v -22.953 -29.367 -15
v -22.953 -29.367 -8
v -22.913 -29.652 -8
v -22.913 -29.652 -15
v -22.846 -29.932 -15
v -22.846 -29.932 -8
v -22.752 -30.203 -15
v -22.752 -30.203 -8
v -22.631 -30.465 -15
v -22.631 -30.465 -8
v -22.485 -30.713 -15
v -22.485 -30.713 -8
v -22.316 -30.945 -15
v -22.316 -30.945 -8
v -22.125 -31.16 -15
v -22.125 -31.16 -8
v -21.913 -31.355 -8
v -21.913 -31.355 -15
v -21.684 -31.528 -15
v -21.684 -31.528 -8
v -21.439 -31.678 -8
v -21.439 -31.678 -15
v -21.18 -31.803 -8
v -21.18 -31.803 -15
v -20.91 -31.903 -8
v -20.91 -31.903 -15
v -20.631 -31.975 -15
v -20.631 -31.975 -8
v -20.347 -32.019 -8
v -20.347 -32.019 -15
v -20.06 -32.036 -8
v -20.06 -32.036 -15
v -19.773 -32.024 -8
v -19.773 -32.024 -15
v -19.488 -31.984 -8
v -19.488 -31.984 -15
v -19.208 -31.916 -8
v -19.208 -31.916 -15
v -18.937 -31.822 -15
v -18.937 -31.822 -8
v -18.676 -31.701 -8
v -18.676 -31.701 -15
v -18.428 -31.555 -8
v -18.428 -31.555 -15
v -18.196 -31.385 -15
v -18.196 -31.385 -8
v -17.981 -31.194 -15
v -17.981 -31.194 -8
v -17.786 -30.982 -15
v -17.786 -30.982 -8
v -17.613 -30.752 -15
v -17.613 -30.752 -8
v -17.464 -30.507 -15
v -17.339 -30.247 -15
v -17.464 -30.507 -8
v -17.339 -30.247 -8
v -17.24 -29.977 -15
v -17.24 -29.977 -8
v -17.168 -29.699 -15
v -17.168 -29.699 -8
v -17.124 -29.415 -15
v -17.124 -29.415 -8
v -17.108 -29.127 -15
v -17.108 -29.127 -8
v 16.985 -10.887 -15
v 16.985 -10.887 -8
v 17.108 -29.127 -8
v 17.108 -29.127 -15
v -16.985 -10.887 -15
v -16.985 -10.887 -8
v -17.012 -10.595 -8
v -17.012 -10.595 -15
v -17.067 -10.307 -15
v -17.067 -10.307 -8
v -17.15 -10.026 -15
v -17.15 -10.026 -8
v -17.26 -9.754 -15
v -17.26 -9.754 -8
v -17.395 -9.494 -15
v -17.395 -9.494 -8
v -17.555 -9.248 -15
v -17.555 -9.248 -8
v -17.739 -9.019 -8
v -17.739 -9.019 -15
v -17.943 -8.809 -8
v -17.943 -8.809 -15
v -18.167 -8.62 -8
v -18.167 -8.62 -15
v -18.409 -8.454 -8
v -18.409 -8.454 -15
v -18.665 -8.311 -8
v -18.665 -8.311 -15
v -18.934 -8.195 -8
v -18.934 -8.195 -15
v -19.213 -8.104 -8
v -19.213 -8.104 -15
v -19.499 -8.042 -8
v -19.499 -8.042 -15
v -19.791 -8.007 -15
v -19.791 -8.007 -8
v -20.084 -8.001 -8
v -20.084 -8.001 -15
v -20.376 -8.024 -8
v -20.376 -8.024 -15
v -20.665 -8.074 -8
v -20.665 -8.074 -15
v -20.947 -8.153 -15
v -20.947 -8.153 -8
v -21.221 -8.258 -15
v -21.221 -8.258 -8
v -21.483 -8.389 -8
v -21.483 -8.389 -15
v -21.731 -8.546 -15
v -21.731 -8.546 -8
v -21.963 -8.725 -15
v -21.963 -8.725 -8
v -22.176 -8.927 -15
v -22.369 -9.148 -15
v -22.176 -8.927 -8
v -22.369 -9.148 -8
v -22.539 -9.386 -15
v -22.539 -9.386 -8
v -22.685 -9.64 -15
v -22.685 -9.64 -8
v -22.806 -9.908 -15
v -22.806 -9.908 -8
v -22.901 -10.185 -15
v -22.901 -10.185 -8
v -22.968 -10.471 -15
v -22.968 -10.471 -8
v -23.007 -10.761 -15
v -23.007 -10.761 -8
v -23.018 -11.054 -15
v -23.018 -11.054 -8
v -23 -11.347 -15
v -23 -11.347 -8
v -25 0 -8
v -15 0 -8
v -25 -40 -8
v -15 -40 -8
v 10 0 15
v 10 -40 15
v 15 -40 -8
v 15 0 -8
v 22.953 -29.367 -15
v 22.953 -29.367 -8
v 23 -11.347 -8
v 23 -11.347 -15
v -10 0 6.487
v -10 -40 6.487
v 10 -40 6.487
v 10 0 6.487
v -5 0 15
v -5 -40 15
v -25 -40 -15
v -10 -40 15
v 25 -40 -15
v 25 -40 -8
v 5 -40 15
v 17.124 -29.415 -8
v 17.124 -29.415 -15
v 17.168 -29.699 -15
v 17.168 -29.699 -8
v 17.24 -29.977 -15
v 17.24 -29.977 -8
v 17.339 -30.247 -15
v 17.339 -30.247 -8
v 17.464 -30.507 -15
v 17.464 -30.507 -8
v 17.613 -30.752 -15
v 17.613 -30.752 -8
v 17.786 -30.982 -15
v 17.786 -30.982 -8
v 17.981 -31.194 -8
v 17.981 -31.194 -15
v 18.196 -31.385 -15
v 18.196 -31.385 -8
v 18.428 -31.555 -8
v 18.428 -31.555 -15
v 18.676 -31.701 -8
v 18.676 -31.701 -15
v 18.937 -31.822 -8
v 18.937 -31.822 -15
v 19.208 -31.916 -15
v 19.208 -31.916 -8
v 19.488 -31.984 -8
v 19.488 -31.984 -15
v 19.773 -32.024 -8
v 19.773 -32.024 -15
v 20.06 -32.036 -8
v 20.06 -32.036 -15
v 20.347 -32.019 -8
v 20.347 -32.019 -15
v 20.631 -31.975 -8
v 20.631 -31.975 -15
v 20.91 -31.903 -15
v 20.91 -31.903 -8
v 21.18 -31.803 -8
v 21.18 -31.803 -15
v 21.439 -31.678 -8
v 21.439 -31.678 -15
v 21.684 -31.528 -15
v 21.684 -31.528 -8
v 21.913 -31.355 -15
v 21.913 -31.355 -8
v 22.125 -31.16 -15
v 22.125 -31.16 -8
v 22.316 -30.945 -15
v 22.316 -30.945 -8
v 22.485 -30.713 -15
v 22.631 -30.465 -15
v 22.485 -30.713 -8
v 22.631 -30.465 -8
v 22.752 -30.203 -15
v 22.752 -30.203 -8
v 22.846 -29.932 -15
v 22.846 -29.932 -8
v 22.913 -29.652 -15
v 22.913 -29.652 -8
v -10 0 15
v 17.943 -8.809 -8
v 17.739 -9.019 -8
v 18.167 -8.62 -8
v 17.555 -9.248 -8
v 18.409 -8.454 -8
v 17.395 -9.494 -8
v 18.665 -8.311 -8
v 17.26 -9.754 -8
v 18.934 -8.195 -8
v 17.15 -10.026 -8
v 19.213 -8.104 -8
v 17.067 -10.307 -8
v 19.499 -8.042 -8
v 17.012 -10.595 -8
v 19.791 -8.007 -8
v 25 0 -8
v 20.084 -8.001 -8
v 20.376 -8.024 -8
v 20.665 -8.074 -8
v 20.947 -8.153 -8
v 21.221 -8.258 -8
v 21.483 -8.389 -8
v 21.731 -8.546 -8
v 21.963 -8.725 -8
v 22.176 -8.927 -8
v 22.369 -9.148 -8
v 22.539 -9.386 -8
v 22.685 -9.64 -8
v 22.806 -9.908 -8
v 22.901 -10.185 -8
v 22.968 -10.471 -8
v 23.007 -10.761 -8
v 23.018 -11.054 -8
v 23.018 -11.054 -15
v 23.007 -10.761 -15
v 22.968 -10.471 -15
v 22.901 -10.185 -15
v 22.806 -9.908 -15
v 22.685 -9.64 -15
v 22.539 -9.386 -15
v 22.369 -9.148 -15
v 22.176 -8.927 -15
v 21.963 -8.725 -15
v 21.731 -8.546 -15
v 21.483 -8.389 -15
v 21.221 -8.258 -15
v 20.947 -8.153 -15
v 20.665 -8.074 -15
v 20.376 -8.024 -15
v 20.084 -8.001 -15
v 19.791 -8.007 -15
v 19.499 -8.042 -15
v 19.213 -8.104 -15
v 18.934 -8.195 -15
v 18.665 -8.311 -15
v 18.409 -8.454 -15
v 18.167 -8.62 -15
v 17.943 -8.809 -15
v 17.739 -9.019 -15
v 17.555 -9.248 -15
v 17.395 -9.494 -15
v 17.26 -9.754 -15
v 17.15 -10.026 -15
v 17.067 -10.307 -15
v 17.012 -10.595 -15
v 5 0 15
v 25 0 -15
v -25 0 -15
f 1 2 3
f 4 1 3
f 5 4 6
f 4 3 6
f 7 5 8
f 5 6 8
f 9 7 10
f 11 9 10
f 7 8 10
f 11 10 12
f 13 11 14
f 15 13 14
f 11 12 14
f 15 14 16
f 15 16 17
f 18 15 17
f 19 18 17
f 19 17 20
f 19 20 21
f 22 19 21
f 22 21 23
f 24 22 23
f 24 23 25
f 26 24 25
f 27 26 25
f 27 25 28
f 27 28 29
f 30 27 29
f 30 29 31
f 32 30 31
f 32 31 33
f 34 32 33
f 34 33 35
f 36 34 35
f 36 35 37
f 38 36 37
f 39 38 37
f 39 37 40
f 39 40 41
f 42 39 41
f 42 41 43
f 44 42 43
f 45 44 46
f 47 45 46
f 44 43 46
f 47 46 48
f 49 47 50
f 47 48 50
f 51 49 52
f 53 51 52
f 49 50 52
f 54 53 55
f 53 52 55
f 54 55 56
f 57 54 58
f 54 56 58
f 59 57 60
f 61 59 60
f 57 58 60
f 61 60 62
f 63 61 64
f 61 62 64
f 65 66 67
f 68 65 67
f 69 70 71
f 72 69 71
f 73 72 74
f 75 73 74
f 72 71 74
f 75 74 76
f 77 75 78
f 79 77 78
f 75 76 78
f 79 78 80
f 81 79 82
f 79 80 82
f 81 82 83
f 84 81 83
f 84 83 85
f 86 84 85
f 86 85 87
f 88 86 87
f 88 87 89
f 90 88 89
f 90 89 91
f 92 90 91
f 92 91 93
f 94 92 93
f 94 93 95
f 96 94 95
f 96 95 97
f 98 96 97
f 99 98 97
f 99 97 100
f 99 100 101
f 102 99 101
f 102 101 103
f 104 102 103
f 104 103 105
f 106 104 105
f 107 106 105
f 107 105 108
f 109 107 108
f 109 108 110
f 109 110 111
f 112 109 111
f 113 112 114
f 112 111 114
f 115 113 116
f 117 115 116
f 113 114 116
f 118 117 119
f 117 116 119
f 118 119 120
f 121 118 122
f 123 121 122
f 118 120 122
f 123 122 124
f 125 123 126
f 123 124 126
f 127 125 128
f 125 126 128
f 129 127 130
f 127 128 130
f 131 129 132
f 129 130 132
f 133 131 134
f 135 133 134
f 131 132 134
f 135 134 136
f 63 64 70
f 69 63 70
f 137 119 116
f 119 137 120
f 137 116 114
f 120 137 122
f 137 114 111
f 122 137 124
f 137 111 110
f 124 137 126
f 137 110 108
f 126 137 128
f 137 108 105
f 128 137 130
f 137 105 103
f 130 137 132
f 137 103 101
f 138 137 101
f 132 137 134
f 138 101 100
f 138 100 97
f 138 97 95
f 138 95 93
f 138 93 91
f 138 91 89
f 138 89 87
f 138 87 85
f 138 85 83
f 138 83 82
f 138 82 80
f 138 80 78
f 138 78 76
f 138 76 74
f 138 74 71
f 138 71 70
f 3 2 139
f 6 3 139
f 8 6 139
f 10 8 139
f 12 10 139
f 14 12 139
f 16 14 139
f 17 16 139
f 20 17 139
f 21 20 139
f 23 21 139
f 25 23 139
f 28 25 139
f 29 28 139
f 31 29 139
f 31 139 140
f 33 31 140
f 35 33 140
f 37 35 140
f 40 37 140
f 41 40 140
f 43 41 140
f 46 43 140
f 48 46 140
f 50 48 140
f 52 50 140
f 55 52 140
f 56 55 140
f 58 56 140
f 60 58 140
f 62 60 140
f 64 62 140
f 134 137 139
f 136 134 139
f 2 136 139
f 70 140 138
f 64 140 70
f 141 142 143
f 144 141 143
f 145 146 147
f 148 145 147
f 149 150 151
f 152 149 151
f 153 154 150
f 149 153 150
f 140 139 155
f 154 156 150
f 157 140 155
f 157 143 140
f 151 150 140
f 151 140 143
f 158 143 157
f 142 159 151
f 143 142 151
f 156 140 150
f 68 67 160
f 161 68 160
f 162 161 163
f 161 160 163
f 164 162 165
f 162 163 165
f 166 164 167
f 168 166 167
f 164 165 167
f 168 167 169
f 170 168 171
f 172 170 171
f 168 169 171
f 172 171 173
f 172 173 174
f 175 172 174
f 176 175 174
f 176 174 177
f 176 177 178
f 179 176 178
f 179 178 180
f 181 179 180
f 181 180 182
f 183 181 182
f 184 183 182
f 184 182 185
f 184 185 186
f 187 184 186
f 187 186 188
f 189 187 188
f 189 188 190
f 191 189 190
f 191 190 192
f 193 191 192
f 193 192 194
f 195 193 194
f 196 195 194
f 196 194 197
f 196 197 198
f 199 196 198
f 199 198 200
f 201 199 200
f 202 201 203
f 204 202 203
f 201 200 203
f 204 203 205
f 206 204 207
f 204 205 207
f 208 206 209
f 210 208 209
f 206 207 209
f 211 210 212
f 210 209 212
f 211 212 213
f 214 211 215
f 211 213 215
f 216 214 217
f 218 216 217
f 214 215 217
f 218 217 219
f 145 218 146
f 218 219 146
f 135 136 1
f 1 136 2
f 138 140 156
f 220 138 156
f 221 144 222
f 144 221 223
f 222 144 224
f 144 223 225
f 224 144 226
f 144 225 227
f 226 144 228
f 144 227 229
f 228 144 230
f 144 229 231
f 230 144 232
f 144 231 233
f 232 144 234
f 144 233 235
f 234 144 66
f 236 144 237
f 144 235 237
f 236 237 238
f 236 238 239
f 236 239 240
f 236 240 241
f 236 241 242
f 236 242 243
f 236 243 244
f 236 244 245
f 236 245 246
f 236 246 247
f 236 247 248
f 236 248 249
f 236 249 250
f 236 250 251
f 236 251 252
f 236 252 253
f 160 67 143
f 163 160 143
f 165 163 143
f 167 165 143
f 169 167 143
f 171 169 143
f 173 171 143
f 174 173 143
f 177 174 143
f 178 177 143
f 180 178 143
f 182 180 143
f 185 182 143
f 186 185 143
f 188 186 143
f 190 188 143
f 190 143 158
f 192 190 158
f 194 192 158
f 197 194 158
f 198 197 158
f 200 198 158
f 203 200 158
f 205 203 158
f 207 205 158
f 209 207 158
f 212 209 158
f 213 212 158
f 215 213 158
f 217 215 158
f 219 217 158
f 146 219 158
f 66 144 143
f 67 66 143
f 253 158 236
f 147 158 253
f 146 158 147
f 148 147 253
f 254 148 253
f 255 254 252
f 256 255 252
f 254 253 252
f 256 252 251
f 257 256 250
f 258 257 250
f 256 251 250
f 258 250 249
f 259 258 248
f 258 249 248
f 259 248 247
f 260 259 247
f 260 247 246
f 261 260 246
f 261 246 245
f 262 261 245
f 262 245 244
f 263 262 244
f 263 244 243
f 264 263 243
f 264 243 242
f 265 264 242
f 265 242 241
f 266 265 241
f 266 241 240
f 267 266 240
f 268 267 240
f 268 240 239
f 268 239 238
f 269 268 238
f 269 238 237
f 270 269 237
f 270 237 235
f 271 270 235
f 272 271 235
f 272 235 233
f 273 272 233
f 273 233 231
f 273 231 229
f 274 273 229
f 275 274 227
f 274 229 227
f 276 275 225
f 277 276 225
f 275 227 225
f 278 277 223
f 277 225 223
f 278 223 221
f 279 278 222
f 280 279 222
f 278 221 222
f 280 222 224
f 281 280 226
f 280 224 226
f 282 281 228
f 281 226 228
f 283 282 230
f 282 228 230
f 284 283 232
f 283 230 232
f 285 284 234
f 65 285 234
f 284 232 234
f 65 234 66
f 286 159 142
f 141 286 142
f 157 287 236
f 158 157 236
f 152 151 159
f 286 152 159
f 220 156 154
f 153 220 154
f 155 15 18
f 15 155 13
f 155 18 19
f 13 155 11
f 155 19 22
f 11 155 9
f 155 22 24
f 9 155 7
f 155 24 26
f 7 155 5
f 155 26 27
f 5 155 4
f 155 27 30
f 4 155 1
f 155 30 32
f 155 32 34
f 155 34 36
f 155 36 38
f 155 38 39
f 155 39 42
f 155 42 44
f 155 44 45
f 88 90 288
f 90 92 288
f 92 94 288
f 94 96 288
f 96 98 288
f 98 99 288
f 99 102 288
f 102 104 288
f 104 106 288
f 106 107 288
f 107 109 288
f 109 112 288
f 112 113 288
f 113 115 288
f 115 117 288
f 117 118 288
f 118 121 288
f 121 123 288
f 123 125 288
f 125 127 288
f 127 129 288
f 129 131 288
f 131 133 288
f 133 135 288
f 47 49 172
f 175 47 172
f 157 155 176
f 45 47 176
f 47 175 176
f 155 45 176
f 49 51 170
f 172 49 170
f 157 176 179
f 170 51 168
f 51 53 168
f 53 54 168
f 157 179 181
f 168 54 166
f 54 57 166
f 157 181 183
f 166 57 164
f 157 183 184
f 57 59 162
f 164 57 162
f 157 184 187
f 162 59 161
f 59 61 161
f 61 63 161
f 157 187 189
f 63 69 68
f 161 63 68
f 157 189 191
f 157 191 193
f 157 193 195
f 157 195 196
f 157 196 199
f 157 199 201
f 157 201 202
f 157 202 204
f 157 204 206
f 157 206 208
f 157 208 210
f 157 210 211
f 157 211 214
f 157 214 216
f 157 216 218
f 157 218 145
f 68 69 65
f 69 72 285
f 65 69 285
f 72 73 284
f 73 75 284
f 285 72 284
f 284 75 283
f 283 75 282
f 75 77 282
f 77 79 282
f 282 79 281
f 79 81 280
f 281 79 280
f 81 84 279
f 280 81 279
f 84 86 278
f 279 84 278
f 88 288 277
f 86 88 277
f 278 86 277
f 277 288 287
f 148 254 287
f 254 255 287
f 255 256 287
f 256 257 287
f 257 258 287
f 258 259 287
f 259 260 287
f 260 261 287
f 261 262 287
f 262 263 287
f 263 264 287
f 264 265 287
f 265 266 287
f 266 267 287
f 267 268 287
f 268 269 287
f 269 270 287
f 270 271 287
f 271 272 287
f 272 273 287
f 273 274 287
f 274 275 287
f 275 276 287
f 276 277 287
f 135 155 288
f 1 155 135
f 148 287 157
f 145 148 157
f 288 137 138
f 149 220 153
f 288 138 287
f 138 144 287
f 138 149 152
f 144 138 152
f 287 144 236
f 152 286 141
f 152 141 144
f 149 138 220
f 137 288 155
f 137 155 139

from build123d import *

# Parameters (mm, degrees)
F0_W      = 50
F0_H      = 30
F1_DEPTH  = 40
F2_W      = 10
F2_H      = 23
F3_DEPTH  = 40.001
F5_DEPTH  = 7.001
F7_DEPTH  = 40.001
F8_DEPTH  = 91
F10_DEPTH = 40.001


# Not quite as in the source:
# - an extrude ends at something that could not be found from the text; its depth is read off the source's solid


with BuildPart() as f1:
    # F0 (on Front) → F1 (new body)
    with BuildSketch(Plane.XZ):
        Rectangle(F0_W, F0_H)
    extrude(amount=F1_DEPTH)

    # F2 (on face) → F3 (cut, through all)
    with BuildSketch(Plane.XZ.offset(40)):
        with Locations((-20, 3.5)):
            Rectangle(F2_W, F2_H)
        with Locations((20, 3.5)):
            Rectangle(F2_W, F2_H)
    extrude(amount=-F3_DEPTH, mode=Mode.SUBTRACT)

    # F4 (on face) → F5 (cut, through all)
    with BuildSketch(Plane.XY.offset(-8)):
        with BuildLine():
            Line((-17.1079541888, -29.1274278762), (-16.9848898668, -10.886759475))
            ThreePointArc((-16.9848898668, -10.886759475), (-20.2301216242, -8.0087862495), (-23, -11.346754618))
            Line((-23, -11.346754618), (-22.9528288916, -29.3672662228))
            ThreePointArc((-22.9528288916, -29.3672662228), (-19.9160668858, -32.0334456443), (-17.1079541888, -29.1274278762))
        make_face()
        with BuildLine():
            ThreePointArc((23, -11.346754618), (20.2301216242, -8.0087862495), (16.9848898668, -10.886759475))
            Line((16.9848898668, -10.886759475), (17.1079541888, -29.1274278762))
            ThreePointArc((17.1079541888, -29.1274278762), (19.9160668858, -32.0334456443), (22.9528288916, -29.3672662228))
            Line((22.9528288916, -29.3672662228), (23, -11.346754618))
        make_face()
    extrude(amount=-F5_DEPTH, mode=Mode.SUBTRACT)

    # F6 (on face) → F7 (cut, through all)
    with BuildSketch(Plane.XZ.offset(40)):
        Polygon((15, 15), (10, 15), (15, -8), align=None)
        Polygon((-15, -8), (-10, 15), (-15, 15), align=None)
    extrude(amount=-F7_DEPTH, mode=Mode.SUBTRACT)

    # F6 (on face) → F8 (cut, through all)
    with BuildSketch(Plane.XZ.offset(40)):
        Polygon((-15, -8), (-10, 15), (-15, 15), align=None)
        Polygon((15, 15), (10, 15), (15, -8), align=None)
    extrude(amount=F8_DEPTH, mode=Mode.SUBTRACT)

    # F9 (on face) → F10 (cut, through all)
    with BuildSketch(Plane.XZ.offset(40)):
        Polygon((-5, 15), (-10, 6.486502476), (0, 6.486502476), (10, 6.486502476), (5, 15), align=None)
    extrude(amount=-F10_DEPTH, mode=Mode.SUBTRACT)


solid = f1.part
